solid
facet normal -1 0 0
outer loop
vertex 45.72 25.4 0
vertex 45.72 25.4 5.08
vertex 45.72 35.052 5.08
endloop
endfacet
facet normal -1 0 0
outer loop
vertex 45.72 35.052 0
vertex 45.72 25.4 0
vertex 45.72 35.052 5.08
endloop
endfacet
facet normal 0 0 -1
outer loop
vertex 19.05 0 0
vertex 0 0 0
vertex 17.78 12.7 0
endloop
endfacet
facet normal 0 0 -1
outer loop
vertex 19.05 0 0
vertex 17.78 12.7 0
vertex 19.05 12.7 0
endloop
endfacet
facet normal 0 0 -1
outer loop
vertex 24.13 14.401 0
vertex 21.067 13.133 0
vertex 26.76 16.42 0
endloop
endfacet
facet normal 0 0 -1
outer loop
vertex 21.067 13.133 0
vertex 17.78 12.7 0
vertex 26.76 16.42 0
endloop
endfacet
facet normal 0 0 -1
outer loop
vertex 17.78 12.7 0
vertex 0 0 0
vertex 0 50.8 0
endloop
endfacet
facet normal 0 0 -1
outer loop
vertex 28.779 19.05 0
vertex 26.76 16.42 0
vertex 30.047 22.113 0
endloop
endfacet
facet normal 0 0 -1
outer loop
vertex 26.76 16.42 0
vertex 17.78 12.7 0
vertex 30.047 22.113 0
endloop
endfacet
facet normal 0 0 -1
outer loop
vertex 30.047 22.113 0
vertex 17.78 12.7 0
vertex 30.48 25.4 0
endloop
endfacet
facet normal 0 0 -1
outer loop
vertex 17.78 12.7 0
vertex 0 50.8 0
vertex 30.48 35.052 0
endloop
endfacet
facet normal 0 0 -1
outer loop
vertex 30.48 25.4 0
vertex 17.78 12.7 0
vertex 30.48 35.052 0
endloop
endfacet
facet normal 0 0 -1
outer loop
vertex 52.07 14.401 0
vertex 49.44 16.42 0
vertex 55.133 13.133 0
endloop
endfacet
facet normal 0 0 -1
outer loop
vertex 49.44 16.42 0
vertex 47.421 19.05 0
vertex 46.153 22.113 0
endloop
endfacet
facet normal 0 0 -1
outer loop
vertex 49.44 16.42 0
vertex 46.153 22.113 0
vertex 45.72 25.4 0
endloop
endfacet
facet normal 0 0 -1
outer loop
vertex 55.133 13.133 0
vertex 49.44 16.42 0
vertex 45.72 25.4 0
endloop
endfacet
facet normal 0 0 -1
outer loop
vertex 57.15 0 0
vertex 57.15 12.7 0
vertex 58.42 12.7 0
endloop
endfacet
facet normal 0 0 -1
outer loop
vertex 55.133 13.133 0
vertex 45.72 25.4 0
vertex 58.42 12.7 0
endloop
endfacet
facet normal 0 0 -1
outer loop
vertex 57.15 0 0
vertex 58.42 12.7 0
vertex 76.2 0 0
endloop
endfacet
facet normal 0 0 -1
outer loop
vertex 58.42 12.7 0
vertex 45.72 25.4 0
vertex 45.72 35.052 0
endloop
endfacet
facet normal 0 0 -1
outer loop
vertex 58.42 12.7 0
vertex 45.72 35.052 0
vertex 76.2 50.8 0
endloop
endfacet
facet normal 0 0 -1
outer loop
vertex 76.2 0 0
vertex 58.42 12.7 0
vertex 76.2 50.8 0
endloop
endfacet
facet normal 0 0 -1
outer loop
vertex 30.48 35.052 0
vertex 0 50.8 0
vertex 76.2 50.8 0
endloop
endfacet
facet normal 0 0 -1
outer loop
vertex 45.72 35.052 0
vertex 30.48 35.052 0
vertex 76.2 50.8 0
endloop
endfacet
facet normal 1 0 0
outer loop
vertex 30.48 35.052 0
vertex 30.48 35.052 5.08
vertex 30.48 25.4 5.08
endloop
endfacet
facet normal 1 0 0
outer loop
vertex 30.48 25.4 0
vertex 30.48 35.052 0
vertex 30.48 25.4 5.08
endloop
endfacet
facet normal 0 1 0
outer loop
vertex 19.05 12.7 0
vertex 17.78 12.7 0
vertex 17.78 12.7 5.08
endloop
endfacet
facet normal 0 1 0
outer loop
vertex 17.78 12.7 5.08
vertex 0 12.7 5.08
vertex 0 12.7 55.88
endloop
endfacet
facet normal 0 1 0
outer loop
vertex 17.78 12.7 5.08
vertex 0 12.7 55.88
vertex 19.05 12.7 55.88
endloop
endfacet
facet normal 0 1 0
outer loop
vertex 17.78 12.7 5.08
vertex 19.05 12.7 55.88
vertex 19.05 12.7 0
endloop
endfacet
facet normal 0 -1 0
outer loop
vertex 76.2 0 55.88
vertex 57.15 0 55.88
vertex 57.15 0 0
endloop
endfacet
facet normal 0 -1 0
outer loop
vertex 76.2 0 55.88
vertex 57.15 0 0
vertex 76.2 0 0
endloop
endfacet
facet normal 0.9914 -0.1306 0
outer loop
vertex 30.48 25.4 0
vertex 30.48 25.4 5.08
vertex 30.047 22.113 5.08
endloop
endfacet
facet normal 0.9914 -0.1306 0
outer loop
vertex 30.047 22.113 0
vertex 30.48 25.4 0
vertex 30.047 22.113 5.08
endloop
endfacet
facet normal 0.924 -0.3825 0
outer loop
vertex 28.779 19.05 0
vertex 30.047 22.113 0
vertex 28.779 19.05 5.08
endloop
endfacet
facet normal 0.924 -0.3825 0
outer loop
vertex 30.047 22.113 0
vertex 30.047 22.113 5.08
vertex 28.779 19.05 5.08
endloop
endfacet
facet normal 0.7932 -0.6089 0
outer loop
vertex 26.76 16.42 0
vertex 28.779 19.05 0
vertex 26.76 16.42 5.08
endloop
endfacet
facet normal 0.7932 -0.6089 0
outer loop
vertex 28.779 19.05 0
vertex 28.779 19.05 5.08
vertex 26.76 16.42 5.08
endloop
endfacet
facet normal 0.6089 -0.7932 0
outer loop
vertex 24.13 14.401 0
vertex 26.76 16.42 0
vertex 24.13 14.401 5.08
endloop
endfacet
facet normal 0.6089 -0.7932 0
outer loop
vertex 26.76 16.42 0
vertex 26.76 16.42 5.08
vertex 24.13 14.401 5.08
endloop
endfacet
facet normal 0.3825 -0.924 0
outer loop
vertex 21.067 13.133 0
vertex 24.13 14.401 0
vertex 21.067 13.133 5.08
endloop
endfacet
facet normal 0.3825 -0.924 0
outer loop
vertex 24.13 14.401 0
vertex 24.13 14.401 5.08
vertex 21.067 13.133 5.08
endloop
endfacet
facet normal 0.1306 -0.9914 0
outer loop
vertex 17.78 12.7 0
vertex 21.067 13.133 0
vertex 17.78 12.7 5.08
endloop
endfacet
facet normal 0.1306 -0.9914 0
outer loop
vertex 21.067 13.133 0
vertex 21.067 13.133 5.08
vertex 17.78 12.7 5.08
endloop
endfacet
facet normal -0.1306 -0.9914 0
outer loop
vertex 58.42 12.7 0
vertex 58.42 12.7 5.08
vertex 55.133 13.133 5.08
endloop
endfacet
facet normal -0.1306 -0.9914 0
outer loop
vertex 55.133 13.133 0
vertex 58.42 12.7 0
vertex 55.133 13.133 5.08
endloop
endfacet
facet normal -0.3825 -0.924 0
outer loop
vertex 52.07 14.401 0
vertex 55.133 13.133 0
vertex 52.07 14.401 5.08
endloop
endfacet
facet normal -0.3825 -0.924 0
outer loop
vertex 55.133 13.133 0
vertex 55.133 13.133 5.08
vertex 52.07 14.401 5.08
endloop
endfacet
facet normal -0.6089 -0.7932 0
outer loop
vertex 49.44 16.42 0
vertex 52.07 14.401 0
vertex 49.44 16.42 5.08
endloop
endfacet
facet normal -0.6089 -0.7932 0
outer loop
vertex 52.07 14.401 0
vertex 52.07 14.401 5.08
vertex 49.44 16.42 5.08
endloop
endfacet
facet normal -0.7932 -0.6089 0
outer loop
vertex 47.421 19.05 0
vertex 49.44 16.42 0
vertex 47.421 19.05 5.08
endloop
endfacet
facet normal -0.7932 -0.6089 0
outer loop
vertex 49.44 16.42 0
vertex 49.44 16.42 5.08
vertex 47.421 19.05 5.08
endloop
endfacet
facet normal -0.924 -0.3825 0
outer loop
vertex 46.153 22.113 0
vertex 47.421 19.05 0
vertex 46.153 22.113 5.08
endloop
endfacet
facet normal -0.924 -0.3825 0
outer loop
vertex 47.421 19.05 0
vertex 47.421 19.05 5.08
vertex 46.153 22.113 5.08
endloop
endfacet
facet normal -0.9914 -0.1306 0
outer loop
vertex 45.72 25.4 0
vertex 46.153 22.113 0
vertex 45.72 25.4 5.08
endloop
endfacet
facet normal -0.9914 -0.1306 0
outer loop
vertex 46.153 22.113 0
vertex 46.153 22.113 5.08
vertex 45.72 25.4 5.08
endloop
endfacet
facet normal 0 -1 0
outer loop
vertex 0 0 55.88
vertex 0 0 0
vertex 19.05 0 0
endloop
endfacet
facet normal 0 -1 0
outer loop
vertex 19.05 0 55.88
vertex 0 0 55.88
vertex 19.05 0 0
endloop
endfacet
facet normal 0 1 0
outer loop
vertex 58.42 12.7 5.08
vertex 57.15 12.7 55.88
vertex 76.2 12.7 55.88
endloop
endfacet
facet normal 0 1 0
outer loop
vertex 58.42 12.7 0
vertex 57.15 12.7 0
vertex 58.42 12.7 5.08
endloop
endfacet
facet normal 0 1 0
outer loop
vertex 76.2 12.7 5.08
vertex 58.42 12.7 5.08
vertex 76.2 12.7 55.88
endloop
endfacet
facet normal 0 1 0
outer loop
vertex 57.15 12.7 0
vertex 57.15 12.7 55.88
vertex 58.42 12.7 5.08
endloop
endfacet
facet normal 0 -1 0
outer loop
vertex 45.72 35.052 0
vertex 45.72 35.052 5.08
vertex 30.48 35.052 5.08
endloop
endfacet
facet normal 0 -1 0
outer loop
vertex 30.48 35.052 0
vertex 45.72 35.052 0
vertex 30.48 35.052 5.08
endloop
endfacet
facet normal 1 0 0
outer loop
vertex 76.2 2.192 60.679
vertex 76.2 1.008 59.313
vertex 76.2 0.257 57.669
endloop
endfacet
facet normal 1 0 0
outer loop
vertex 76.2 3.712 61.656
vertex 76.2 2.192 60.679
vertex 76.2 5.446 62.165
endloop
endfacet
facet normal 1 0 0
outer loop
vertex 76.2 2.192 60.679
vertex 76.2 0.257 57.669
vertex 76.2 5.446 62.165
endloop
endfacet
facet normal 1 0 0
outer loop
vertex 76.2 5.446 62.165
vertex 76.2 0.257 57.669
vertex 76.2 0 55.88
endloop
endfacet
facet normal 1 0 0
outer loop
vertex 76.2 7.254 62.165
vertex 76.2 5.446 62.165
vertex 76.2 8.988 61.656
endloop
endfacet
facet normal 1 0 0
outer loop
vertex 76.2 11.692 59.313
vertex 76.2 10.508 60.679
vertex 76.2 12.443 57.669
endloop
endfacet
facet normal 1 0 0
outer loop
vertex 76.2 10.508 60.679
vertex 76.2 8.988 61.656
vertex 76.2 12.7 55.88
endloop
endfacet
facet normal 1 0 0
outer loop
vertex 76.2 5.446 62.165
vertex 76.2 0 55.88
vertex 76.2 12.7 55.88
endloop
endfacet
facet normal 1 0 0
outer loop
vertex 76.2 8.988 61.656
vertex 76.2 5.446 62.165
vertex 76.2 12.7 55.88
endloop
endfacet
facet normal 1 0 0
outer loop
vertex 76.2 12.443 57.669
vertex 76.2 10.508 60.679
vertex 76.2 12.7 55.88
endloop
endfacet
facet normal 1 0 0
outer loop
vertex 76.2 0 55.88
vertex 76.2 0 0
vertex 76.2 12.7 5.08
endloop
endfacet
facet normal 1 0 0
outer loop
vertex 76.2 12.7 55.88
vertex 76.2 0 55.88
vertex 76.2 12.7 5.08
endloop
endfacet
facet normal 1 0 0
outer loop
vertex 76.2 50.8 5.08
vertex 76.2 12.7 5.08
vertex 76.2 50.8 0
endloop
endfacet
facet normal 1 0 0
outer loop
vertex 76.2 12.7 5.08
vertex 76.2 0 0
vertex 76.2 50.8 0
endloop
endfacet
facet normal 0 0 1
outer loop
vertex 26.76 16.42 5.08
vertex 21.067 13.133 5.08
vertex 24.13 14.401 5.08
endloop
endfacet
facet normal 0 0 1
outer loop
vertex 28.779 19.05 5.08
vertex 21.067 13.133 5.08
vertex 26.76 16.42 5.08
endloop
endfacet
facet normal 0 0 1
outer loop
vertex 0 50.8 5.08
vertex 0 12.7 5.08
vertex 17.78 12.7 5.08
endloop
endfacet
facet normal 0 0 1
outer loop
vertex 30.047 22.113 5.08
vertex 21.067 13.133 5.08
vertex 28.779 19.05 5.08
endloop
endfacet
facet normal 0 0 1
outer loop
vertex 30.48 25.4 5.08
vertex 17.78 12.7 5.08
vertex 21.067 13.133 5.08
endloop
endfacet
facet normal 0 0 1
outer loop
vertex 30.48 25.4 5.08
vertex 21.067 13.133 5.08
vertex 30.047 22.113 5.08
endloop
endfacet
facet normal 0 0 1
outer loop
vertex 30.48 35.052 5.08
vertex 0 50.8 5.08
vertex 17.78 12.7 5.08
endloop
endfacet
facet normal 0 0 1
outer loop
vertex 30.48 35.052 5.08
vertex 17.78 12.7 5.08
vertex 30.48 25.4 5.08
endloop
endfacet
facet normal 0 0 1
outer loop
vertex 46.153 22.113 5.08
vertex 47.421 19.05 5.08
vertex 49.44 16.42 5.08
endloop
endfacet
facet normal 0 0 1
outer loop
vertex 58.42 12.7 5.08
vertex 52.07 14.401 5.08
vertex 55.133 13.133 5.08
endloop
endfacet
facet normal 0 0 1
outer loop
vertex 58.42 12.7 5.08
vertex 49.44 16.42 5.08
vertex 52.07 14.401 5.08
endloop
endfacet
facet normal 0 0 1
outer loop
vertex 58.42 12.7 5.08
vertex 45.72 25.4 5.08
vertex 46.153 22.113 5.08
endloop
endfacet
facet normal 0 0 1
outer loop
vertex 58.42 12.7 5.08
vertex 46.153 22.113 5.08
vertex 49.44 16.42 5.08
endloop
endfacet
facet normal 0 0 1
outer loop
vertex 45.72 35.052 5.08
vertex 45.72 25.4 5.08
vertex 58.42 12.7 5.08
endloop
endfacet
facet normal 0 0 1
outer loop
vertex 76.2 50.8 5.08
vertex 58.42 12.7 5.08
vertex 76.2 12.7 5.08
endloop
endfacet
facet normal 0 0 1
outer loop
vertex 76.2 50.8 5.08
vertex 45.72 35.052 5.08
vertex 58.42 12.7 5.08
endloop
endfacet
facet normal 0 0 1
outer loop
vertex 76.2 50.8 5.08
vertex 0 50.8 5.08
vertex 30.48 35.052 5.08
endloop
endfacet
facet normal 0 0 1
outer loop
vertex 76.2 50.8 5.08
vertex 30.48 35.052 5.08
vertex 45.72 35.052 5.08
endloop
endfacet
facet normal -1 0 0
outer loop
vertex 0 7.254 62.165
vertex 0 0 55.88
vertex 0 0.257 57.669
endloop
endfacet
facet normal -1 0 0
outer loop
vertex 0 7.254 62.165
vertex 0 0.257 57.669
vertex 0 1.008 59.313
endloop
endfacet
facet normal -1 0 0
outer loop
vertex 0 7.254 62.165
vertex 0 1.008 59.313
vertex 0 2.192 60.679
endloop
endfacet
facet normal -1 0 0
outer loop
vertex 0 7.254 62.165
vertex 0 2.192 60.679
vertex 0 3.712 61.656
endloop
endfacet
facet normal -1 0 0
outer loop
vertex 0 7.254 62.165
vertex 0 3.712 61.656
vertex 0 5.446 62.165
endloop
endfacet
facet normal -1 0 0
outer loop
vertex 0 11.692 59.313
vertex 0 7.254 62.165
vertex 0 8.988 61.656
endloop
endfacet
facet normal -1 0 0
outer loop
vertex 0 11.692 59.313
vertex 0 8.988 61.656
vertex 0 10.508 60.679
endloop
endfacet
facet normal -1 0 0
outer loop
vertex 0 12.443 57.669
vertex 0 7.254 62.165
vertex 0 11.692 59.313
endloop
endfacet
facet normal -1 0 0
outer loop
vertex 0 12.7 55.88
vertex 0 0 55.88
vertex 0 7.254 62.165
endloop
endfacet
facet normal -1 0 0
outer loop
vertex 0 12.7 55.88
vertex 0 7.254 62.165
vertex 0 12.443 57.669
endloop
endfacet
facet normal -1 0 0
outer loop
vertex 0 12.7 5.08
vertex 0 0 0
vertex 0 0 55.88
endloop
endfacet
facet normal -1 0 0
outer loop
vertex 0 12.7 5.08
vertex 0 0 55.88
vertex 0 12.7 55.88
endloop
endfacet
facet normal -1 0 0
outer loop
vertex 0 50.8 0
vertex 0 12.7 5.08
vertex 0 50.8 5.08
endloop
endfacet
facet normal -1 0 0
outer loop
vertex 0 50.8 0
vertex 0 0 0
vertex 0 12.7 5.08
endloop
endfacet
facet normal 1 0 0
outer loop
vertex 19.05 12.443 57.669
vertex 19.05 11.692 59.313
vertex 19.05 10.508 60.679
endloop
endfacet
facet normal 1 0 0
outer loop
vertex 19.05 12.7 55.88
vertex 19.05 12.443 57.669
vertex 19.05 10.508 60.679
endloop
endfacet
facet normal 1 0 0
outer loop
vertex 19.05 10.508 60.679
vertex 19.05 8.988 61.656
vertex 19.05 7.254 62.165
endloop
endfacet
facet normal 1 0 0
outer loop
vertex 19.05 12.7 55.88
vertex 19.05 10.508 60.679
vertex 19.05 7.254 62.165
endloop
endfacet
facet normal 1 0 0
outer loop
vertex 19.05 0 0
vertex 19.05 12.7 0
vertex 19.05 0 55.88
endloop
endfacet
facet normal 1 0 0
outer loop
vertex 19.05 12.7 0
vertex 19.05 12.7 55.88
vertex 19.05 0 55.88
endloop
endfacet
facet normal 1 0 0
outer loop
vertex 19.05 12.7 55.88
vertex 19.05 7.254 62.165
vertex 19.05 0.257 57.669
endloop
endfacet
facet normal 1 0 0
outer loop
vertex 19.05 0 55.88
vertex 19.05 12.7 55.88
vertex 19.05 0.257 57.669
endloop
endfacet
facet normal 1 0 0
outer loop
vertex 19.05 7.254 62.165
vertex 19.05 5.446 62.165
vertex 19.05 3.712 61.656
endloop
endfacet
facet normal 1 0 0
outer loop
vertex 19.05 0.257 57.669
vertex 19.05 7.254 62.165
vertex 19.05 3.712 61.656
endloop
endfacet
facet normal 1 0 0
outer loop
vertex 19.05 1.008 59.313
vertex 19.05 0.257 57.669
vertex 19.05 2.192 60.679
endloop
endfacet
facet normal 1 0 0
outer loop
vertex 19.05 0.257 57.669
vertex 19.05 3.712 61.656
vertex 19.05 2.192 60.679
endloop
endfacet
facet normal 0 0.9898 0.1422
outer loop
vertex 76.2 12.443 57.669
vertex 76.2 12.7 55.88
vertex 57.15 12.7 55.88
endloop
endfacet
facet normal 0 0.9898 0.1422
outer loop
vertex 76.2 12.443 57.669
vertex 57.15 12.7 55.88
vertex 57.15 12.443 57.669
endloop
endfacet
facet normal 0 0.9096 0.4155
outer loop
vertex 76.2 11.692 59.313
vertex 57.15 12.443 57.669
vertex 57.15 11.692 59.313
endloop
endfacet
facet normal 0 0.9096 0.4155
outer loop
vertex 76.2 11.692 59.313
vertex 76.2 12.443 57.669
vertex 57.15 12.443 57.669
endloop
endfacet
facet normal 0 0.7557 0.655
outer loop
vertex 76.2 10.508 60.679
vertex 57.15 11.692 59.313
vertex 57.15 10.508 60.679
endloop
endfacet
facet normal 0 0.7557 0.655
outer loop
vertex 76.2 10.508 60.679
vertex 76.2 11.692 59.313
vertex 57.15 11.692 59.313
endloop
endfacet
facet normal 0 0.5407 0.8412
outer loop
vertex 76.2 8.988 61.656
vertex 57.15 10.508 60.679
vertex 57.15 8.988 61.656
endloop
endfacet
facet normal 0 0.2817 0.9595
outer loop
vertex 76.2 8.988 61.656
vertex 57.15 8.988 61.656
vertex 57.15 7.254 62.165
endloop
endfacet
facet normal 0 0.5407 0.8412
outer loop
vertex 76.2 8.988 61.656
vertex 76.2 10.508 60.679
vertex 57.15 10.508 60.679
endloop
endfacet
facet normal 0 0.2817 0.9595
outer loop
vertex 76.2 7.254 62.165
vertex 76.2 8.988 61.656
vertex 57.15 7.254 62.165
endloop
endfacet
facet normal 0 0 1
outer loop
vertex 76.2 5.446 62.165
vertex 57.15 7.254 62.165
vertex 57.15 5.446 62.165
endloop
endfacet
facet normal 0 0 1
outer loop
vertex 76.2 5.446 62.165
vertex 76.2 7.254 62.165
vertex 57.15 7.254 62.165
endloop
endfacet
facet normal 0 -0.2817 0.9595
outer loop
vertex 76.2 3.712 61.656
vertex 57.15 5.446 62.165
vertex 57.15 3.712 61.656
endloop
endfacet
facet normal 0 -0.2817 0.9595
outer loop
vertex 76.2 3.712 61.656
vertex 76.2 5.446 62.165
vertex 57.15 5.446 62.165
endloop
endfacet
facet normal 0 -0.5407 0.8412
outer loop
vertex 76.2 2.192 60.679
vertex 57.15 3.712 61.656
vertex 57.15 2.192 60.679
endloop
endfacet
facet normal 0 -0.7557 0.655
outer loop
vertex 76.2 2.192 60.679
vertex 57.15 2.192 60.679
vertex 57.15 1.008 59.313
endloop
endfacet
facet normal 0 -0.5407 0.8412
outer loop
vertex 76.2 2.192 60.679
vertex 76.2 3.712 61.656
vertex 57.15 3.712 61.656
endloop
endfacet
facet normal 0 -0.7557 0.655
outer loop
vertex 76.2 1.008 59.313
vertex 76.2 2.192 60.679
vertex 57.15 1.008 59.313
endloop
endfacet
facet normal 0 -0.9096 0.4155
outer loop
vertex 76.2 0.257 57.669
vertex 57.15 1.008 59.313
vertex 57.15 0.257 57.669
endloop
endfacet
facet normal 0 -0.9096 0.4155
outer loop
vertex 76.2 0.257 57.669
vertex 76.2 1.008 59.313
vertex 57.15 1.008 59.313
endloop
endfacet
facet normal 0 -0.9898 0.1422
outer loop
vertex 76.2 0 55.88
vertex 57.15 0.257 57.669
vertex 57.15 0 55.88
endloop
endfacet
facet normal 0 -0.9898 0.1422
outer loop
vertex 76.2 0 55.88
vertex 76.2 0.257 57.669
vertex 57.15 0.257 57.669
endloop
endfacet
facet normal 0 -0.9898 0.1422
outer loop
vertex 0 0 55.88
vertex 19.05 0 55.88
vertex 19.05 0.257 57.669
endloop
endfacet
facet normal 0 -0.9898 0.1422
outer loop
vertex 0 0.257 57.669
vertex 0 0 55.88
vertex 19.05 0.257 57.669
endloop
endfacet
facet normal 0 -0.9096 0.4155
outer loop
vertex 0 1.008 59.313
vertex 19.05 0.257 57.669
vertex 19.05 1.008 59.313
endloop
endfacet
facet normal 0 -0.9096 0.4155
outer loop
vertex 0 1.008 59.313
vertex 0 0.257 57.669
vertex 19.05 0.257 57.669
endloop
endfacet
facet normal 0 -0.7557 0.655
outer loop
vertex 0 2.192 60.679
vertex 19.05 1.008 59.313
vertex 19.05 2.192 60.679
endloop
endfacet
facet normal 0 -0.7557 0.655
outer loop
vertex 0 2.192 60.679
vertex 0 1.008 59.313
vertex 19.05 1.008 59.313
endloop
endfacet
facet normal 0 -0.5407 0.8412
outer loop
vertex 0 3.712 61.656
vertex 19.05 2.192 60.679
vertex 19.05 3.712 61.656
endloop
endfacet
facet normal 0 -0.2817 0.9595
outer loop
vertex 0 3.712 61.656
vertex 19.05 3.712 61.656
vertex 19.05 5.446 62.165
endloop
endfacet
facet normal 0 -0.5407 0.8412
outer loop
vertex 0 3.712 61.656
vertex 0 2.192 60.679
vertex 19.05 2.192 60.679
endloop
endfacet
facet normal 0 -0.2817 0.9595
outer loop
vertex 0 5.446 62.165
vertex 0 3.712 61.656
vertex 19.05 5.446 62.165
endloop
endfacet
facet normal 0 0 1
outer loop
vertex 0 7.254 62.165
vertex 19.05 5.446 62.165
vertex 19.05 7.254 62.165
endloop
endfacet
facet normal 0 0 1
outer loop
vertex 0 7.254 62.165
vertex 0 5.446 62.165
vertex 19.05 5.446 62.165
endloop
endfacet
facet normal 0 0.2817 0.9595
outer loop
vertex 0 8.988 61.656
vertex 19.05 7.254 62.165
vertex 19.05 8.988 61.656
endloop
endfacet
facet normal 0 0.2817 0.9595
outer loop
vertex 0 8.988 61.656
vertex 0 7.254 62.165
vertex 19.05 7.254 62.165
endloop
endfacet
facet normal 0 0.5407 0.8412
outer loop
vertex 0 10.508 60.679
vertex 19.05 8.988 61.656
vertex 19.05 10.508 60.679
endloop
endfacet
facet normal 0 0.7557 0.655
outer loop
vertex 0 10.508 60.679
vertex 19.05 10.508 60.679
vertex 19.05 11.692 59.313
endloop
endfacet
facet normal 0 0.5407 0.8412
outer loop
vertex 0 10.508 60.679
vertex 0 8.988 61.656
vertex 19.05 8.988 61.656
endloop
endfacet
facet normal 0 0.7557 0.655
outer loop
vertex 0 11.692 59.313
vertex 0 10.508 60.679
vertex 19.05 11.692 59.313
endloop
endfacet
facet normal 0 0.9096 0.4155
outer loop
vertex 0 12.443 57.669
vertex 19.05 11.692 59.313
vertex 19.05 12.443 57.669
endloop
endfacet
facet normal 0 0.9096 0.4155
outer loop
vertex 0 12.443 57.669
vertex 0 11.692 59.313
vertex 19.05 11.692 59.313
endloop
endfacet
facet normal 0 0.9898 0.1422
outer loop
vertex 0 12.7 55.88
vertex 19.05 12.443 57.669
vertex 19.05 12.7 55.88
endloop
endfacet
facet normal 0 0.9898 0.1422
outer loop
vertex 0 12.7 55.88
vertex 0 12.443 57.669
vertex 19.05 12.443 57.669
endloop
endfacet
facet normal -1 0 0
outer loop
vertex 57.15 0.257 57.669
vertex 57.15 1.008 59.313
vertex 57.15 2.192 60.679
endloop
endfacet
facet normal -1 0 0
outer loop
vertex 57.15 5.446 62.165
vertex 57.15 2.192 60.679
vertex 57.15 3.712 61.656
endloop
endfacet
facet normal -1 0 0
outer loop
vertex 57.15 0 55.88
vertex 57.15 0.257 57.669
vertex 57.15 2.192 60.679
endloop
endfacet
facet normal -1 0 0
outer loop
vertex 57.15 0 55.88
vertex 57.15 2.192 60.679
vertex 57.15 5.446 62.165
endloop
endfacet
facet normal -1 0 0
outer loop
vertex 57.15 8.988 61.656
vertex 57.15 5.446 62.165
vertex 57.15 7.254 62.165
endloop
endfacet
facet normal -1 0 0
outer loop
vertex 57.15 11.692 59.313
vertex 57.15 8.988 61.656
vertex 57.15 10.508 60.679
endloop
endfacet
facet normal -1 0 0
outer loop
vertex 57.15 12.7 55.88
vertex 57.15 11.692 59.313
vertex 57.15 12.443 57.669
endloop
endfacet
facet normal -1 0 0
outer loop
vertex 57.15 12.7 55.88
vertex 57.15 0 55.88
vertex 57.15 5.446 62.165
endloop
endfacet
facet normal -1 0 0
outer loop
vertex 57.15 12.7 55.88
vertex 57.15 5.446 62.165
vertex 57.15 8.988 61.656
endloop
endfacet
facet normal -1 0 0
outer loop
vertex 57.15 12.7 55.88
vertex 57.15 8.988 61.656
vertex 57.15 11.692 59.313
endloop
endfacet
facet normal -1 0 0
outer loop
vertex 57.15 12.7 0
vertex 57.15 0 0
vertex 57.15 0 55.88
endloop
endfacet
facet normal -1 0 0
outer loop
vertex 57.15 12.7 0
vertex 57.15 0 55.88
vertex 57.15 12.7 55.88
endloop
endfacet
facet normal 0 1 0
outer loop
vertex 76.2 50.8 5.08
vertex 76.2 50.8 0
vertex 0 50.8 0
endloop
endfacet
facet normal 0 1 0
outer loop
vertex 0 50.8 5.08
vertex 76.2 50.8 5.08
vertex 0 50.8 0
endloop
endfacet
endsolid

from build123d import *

# Parameters (mm, degrees)
F1_DEPTH = 5.08
F2_W     = 19.05
F2_H     = 12.7
F3_DEPTH = 50.8
F5_DEPTH = 19.05
F7_DEPTH = 19.05
F9_DEPTH = 5.08


with BuildPart() as f1:
    # F0 (on Top) → F1 (new body)
    with BuildSketch(Plane.XY):
        Polygon((0, 12.7), (0, 0), (19.05, 0), (76.2, 0), (76.2, 50.8), (0, 50.8), align=None)
    extrude(amount=F1_DEPTH)

    # F2 (on face) → F3 (join)
    with BuildSketch(Plane.XY.offset(5.08)):
        with Locations((9.525, 6.35)):
            Rectangle(F2_W, F2_H)
        with Locations((66.675, 6.35)):
            Rectangle(F2_W, F2_H)
    extrude(amount=F3_DEPTH)

    # F4 (on face) → F5 (join)
    with BuildSketch(Plane(origin=(0, 0, 0), x_dir=(0, -1, 0), z_dir=(-1, 0, 0))):
        with BuildLine():
            Line((-12.7, 55.88), (0, 55.88))
            ThreePointArc((0, 55.88), (-6.35, 62.23), (-12.7, 55.88))
        make_face()
        with BuildLine():
            ThreePointArc((-12.7, 55.88), (-6.35, 49.53), (0, 55.88))
            Line((0, 55.88), (-12.7, 55.88))
        make_face()
    extrude(amount=-F5_DEPTH)

    # F6 (on face) → F7 (join)
    with BuildSketch(Plane.YZ.offset(76.2)):
        with BuildLine():
            ThreePointArc((0, 55.88), (6.35, 49.53), (12.7, 55.88))
            Line((12.7, 55.88), (0, 55.88))
        make_face()
        with BuildLine():
            Line((0, 55.88), (12.7, 55.88))
            ThreePointArc((12.7, 55.88), (6.35, 62.23), (0, 55.88))
        make_face()
    extrude(amount=-F7_DEPTH)

    # F8 (on face) → F9 (cut)
    with BuildSketch(Plane.XY.offset(5.08)):
        with BuildLine():
            ThreePointArc((30.48, 25.4), (26.760256, 16.419744), (17.78, 12.7))
            Line((17.78, 12.7), (19.05, 12.7))
            Line((19.05, 12.7), (19.05, 0))
            Line((19.05, 0), (57.15, 0))
            Line((57.15, 0), (57.15, 12.7))
            Line((57.15, 12.7), (58.42, 12.7))
            ThreePointArc((58.42, 12.7), (49.439744, 16.419744), (45.72, 25.4))
            Line((45.72, 25.4), (45.72, 35.052))
            Line((45.72, 35.052), (30.48, 35.052))
            Line((30.48, 35.052), (30.48, 25.4))
        make_face()
    extrude(amount=-F9_DEPTH, mode=Mode.SUBTRACT)


solid = f1.part
